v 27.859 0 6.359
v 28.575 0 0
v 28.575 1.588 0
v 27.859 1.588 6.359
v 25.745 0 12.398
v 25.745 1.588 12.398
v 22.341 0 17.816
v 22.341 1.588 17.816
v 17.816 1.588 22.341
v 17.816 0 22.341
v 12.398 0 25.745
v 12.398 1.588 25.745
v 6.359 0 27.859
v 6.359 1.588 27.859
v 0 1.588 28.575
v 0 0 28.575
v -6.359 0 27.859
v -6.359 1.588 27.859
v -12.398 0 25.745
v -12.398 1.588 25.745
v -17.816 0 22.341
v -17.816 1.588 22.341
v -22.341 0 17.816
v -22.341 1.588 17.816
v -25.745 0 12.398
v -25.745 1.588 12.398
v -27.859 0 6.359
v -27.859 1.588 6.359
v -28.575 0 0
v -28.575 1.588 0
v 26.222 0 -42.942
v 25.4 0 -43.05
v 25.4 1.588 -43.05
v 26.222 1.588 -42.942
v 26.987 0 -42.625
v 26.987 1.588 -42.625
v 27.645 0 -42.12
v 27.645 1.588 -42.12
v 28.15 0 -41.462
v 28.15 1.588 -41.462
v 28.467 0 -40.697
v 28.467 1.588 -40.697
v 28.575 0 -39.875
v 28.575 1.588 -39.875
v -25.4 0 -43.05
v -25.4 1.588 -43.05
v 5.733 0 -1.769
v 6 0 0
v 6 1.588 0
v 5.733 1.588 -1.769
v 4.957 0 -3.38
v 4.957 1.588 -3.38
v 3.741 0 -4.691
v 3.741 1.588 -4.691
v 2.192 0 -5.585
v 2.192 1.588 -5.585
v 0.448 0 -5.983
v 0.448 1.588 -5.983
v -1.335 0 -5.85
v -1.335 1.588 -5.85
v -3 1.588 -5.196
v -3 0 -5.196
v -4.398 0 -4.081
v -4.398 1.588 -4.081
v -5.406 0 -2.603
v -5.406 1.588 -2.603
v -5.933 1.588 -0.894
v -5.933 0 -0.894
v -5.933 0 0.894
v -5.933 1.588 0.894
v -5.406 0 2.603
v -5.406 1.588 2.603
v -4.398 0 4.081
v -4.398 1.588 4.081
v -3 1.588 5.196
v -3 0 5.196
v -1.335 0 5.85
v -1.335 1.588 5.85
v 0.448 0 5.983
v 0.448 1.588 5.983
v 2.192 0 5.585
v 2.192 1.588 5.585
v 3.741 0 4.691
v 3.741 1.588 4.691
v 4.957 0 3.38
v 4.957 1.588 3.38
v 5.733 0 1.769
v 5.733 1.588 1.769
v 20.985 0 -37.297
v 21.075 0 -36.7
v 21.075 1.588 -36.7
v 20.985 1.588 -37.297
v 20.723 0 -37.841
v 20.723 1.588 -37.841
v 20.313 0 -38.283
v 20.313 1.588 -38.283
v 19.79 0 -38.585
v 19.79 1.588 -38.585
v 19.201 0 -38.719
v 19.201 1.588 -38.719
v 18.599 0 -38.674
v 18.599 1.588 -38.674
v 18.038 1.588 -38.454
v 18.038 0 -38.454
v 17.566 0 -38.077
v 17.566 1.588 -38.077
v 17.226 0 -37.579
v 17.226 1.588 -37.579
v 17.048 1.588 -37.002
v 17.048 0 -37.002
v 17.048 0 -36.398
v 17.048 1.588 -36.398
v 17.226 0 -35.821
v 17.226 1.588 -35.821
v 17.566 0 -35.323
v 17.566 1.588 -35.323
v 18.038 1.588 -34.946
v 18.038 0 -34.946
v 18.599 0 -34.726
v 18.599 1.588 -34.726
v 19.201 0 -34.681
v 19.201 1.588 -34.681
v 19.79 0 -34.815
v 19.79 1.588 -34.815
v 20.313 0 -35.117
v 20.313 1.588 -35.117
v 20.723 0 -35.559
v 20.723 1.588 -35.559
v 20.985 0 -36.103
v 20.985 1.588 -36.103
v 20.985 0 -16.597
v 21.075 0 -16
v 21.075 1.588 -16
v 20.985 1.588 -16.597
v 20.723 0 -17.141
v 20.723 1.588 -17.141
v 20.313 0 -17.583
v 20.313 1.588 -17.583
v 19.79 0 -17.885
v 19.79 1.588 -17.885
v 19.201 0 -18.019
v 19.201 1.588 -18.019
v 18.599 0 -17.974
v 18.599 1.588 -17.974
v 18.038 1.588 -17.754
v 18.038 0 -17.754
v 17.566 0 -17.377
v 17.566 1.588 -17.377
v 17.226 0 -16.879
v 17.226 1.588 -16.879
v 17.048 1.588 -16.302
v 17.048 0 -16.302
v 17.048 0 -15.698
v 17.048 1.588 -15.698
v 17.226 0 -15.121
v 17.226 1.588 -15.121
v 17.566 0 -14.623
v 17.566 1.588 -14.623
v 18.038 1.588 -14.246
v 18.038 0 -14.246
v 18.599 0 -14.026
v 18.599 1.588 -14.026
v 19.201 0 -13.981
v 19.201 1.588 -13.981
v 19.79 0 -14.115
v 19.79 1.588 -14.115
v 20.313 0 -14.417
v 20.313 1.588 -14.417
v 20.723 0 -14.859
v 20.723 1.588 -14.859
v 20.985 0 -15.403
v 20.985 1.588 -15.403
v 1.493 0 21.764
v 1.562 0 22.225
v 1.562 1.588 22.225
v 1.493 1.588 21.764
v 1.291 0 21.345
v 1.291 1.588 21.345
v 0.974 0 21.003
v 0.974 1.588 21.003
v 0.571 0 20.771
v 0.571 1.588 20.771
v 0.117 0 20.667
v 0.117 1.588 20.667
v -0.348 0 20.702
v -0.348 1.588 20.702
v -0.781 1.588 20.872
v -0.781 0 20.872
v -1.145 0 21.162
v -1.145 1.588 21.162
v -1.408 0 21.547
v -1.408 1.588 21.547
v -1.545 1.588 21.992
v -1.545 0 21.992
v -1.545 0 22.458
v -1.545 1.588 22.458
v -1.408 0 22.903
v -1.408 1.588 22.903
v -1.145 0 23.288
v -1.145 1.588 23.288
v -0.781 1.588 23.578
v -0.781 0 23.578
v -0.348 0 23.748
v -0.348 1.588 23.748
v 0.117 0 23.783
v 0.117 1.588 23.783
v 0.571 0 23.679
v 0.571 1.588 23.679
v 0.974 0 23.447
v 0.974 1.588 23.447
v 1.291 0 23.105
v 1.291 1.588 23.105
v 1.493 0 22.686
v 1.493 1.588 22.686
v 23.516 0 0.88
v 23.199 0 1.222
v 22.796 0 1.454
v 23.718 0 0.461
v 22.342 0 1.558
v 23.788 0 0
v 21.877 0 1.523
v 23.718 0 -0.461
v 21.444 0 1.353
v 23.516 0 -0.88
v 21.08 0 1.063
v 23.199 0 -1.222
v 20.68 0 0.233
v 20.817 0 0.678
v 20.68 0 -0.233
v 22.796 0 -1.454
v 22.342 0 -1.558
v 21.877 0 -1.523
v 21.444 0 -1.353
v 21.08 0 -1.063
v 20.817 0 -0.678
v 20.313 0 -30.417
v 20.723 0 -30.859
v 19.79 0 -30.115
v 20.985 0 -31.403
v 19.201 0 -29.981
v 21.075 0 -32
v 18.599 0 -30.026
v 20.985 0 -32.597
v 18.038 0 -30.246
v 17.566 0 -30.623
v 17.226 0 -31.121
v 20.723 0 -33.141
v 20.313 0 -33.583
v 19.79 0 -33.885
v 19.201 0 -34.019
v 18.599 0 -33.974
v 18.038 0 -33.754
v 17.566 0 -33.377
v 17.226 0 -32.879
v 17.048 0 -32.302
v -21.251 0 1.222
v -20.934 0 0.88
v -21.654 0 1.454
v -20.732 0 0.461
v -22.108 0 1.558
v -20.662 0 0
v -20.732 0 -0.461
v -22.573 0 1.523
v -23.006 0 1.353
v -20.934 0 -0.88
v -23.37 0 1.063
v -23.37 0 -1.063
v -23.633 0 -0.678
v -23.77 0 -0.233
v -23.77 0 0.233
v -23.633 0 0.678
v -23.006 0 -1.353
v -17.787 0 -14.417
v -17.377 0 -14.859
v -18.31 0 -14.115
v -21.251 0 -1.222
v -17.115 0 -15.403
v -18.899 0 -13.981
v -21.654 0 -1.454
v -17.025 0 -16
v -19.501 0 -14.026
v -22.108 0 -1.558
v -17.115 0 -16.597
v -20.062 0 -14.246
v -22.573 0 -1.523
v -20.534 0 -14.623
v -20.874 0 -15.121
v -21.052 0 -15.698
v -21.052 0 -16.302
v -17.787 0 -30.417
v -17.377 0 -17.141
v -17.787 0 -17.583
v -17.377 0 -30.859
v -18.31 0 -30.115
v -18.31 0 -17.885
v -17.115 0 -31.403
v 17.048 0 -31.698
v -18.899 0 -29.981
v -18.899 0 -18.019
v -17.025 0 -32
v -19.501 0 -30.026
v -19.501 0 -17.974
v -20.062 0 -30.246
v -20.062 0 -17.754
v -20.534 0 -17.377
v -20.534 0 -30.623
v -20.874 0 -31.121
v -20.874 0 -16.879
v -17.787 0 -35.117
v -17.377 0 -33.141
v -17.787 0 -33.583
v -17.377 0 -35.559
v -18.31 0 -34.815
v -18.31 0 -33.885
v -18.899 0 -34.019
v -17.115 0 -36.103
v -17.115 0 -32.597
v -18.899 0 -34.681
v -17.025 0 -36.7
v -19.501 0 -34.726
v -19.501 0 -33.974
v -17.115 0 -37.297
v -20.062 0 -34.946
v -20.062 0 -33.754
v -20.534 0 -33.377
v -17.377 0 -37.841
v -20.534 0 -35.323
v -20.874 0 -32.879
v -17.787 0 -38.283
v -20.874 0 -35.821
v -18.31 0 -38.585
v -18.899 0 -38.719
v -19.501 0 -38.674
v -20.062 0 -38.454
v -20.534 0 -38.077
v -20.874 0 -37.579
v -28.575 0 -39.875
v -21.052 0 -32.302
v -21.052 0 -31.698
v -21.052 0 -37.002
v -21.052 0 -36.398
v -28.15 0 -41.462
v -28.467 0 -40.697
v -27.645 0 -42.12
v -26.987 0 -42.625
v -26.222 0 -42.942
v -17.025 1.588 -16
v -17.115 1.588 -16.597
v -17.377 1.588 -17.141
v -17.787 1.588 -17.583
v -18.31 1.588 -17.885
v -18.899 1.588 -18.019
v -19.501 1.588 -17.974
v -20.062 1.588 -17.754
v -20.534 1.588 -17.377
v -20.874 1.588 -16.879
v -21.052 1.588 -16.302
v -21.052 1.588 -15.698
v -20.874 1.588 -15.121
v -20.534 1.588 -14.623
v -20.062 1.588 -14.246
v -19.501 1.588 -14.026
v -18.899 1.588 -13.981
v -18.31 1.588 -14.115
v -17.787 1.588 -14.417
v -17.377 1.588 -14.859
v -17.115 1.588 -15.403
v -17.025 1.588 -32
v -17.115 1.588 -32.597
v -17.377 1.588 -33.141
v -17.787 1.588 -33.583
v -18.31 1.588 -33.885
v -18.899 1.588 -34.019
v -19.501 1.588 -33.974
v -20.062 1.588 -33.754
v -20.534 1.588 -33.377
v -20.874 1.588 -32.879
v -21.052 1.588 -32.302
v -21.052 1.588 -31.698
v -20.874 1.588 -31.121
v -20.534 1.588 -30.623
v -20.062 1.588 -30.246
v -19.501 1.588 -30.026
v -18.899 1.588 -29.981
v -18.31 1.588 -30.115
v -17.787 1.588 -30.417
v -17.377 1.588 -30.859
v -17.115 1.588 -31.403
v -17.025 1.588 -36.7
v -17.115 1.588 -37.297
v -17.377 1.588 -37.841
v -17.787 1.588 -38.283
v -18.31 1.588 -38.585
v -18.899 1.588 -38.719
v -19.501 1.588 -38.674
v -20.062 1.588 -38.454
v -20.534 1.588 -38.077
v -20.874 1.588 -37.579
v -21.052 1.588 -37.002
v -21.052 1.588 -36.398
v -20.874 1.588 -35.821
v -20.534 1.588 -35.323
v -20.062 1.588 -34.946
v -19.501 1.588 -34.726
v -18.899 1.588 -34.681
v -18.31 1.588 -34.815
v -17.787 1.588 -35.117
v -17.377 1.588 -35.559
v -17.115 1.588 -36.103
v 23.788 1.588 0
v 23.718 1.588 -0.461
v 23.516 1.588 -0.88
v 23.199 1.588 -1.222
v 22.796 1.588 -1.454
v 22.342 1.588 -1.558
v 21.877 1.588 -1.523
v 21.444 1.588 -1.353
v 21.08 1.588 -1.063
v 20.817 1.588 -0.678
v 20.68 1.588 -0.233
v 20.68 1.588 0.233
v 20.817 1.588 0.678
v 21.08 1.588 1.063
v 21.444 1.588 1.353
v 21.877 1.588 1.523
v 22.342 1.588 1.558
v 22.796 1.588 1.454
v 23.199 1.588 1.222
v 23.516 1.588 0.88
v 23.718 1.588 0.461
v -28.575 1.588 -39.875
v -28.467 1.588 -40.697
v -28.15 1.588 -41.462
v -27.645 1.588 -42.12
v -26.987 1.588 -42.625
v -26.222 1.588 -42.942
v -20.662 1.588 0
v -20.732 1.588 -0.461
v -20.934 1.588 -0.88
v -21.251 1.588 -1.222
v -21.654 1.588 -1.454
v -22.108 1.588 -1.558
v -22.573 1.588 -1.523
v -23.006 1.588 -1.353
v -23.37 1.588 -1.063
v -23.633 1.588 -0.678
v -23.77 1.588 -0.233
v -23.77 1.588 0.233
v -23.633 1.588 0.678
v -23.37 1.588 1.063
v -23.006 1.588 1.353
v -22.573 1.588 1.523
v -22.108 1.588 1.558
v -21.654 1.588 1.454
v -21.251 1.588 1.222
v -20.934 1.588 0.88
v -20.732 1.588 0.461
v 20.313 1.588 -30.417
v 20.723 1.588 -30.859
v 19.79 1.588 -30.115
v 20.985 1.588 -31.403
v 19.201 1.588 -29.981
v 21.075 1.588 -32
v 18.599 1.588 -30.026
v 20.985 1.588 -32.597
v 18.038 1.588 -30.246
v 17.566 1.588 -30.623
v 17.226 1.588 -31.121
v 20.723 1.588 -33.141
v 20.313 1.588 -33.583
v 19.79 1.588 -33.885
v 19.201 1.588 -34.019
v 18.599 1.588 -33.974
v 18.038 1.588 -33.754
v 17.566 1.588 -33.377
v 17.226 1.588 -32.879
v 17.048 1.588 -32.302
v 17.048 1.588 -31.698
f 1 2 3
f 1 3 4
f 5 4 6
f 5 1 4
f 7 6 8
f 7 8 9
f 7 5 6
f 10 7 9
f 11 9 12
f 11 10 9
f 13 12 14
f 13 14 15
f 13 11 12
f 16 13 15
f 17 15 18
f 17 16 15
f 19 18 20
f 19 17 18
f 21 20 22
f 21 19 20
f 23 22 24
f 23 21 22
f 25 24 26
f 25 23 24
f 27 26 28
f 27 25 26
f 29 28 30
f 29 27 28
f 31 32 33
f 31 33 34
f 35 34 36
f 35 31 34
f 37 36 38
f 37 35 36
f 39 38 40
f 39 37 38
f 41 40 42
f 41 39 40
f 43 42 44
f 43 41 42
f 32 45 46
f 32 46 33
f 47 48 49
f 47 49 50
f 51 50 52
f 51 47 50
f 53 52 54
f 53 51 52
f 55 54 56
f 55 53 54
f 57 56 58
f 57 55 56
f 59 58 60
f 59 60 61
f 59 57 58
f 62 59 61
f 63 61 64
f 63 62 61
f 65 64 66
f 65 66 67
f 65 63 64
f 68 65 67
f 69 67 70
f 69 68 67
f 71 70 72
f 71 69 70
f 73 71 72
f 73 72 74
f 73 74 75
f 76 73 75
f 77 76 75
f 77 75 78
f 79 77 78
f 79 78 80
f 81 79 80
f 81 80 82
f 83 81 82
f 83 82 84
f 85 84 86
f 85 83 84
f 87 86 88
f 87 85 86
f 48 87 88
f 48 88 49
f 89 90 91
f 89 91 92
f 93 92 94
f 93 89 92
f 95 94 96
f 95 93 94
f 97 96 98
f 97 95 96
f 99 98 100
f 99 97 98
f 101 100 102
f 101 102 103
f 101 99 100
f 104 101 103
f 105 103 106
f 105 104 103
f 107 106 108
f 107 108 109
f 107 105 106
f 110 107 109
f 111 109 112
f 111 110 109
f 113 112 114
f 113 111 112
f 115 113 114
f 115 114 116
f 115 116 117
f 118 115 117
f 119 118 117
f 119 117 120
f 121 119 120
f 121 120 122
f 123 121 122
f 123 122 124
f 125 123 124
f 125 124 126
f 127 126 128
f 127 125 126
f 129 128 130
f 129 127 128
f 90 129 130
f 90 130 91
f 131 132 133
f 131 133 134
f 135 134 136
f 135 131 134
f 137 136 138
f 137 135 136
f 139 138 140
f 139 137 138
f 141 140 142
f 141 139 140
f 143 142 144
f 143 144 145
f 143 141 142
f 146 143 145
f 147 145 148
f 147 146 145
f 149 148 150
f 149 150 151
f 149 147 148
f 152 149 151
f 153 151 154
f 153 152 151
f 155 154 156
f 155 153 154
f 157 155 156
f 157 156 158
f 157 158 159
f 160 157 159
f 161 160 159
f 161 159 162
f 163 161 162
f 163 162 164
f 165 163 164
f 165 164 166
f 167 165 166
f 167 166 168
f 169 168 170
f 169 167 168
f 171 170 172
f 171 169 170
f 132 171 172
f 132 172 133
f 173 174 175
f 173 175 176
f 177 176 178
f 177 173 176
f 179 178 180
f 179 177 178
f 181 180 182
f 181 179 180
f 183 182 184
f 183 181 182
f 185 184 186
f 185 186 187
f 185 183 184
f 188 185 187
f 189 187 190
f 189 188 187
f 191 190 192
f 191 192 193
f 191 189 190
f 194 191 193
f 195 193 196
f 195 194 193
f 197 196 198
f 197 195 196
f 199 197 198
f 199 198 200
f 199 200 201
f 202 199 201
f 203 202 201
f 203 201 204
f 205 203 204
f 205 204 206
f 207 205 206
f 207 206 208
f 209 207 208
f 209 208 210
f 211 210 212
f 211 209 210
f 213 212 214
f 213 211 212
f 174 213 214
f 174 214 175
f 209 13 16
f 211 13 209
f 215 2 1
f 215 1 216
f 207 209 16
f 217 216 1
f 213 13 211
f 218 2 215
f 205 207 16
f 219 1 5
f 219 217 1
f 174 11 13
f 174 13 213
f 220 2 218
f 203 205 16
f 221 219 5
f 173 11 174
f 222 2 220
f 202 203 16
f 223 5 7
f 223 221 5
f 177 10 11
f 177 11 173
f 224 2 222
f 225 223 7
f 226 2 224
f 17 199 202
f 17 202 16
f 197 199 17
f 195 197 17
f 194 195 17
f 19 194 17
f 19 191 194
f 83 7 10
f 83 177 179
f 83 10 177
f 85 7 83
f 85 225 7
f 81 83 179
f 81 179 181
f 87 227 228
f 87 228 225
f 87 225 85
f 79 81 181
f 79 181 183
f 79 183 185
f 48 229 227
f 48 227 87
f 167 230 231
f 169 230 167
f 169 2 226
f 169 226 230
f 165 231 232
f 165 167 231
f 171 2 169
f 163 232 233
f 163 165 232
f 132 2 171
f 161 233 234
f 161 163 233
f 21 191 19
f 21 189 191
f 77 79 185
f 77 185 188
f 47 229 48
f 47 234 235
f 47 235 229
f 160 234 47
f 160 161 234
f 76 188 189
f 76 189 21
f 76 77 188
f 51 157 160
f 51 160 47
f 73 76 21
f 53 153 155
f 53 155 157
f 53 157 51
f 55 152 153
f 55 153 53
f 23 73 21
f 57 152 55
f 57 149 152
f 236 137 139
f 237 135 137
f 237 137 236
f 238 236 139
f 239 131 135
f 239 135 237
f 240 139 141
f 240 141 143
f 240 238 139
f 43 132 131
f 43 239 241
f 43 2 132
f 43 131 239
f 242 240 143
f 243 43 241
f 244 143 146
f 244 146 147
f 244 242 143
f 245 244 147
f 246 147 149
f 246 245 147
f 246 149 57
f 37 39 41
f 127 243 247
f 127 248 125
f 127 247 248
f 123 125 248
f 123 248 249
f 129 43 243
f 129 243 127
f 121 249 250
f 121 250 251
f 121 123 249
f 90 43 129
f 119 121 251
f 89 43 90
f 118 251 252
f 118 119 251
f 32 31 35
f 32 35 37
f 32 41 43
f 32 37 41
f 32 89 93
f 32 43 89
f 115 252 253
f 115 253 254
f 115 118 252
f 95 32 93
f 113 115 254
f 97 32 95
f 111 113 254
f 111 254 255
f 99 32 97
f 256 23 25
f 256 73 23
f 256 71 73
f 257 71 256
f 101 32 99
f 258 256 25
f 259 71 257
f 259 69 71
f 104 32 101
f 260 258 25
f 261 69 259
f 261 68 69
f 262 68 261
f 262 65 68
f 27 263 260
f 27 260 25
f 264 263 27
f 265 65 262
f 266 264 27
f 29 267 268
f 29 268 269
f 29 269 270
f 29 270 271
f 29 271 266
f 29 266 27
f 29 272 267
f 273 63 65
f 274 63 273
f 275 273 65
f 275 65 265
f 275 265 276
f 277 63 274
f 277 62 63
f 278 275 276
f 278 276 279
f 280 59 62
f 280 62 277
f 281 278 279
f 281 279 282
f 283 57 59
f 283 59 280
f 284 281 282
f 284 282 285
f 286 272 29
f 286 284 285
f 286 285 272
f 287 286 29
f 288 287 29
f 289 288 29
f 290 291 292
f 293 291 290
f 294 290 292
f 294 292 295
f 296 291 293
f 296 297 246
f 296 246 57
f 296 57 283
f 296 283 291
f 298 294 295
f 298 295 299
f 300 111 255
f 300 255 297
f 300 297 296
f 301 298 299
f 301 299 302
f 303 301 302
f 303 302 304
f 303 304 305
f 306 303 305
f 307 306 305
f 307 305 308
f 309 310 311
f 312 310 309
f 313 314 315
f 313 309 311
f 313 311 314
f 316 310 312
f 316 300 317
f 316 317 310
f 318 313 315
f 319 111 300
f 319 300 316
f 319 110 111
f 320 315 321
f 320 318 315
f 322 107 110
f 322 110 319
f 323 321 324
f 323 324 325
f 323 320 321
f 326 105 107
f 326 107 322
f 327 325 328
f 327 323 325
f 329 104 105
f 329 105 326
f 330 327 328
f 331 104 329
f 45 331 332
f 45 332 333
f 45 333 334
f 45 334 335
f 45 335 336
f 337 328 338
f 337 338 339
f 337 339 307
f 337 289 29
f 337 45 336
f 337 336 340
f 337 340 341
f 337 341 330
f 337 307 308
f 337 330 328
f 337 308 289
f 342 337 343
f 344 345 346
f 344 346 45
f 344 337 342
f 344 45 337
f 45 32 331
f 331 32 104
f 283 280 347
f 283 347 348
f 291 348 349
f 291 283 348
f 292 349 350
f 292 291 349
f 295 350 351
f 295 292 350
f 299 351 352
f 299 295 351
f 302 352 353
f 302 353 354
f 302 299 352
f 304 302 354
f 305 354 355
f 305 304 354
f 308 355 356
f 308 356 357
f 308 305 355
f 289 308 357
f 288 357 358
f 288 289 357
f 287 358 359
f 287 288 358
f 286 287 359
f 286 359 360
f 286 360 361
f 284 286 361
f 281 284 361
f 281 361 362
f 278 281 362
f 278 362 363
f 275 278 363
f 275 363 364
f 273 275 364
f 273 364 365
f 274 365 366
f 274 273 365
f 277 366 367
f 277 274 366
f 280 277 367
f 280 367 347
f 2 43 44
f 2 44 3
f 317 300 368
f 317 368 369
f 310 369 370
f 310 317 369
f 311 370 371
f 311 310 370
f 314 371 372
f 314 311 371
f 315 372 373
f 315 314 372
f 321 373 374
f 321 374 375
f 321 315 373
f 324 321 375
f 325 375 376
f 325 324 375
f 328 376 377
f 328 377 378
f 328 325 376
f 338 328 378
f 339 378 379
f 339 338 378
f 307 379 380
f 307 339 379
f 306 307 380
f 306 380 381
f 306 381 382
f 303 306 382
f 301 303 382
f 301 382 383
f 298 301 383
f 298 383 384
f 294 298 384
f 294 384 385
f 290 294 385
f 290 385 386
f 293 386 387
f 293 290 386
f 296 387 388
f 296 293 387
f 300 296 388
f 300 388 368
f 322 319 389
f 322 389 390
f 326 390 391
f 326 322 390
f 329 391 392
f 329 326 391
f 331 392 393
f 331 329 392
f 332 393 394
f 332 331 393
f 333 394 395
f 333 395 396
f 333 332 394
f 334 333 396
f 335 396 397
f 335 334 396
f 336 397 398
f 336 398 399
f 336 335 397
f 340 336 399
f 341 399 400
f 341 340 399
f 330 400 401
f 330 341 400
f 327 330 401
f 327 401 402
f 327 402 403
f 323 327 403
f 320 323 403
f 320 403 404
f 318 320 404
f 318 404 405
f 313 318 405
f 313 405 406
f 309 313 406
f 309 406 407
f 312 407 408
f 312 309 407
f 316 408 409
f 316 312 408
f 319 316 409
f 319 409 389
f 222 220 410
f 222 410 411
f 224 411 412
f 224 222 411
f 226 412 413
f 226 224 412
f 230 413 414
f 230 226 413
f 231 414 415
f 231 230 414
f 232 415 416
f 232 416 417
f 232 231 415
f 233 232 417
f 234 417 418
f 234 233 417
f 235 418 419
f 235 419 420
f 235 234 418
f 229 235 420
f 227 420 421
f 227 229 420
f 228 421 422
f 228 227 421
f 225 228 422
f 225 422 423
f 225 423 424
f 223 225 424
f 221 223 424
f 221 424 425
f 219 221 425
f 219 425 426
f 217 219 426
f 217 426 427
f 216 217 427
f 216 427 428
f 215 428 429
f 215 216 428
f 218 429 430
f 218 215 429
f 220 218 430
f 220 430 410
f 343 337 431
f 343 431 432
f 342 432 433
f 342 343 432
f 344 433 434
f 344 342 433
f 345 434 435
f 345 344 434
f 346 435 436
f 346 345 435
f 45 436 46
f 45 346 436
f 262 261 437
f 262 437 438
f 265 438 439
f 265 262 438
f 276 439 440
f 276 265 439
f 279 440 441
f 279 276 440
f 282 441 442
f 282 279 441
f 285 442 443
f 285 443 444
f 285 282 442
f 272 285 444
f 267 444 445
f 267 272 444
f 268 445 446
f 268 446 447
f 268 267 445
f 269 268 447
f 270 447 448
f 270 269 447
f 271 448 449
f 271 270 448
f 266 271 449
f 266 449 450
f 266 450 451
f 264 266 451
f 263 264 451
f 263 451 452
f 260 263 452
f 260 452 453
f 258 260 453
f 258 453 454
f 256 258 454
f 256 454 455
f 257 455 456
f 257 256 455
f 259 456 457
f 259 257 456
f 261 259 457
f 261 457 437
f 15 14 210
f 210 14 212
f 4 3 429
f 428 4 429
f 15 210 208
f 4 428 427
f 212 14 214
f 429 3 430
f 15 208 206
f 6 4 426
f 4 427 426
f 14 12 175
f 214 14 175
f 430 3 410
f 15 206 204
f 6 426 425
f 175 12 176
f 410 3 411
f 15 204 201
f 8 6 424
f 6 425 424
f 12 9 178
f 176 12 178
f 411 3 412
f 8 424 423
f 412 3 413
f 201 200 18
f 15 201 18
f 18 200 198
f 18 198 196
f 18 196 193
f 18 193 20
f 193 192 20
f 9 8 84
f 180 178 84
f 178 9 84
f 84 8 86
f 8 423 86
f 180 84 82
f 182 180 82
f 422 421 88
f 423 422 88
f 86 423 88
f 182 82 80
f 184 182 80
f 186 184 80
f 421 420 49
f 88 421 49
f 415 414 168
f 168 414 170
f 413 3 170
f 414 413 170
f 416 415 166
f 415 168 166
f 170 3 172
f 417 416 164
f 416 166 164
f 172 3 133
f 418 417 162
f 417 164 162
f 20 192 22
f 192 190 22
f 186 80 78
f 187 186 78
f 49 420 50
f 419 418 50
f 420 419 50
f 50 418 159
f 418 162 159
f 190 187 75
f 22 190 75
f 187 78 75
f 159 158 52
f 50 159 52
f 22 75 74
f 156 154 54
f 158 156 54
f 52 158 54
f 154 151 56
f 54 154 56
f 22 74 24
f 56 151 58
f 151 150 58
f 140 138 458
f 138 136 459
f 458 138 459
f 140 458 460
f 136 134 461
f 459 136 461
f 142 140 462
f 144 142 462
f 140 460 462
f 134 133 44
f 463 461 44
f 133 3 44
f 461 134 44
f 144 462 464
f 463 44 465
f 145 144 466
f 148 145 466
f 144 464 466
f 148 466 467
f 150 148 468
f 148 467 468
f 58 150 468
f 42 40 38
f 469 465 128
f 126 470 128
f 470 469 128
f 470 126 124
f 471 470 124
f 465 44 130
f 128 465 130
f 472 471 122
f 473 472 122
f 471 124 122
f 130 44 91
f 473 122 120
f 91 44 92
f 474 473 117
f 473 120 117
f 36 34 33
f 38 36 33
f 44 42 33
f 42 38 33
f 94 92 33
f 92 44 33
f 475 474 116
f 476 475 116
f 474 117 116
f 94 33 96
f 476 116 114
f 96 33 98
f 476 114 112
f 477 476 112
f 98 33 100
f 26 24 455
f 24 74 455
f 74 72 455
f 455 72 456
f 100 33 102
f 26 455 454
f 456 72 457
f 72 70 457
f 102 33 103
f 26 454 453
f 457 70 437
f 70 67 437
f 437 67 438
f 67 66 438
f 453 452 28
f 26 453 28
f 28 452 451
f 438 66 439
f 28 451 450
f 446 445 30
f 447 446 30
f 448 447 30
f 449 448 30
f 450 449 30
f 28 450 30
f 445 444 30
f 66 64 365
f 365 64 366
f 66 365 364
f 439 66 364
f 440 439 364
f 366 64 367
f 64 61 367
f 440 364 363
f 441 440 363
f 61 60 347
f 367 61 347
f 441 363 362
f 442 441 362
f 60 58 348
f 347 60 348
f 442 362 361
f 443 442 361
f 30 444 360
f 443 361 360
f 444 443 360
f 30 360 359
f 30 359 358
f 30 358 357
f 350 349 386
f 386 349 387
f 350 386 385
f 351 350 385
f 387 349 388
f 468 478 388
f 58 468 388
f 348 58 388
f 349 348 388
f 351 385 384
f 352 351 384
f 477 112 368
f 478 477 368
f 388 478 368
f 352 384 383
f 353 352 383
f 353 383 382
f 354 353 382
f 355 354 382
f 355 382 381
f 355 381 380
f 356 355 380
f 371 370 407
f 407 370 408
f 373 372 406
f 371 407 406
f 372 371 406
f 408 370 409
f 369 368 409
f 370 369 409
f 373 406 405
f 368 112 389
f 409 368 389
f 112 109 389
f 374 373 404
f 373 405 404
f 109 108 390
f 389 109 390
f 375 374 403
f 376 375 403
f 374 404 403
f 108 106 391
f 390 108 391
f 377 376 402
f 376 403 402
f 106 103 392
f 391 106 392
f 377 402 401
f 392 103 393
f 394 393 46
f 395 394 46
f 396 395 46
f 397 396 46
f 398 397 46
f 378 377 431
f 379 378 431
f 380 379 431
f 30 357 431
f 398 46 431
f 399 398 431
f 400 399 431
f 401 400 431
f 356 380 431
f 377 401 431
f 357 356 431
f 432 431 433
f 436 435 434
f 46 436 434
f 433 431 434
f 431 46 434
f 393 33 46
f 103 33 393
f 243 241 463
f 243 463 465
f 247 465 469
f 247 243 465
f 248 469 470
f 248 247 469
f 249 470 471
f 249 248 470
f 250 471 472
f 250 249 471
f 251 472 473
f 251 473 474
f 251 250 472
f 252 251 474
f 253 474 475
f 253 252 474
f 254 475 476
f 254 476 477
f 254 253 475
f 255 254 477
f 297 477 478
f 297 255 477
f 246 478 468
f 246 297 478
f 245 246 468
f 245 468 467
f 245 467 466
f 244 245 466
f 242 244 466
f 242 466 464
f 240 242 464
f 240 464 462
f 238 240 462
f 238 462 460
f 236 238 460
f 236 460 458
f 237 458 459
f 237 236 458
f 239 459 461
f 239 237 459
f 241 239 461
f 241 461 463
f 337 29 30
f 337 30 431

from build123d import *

# Parameters (mm, degrees)
SKETCH1_R           = 6
SKETCH1_R_2         = 1.5625
SKETCH1_R_3         = 2.025
BOSS_EXTRUDE1_DEPTH = 1.5875


with BuildPart() as part:
    # Sketch1 → Boss-Extrude1 (new body)
    with BuildSketch(Plane(origin=(0, 0, 0), x_dir=(1, 0, 0), z_dir=(0, 1, 0))):
        with BuildLine():
            Line((-28.575, 0), (-28.575, 39.875))
            ThreePointArc((-28.575, 39.875), (-27.64506403, 42.12006403), (-25.4, 43.05))
            Line((-25.4, 43.05), (25.4, 43.05))
            ThreePointArc((25.4, 43.05), (27.64506403, 42.12006403), (28.575, 39.875))
            Line((28.575, 39.875), (28.575, 0))
            ThreePointArc((28.575, 0), (0, -28.575), (-28.575, 0))
        make_face()
        Circle(SKETCH1_R, mode=Mode.SUBTRACT)
        with Locations((-22.225, 0)):
            Circle(SKETCH1_R_2, mode=Mode.SUBTRACT)
        with Locations((0, -22.225)):
            Circle(SKETCH1_R_2, mode=Mode.SUBTRACT)
        with Locations((22.225, 0)):
            Circle(SKETCH1_R_2, mode=Mode.SUBTRACT)
        with Locations((-19.05, 16)):
            Circle(SKETCH1_R_3, mode=Mode.SUBTRACT)
        with Locations((19.05, 16)):
            Circle(SKETCH1_R_3, mode=Mode.SUBTRACT)
        with Locations((19.05, 32)):
            Circle(SKETCH1_R_3, mode=Mode.SUBTRACT)
        with Locations((-19.05, 32)):
            Circle(SKETCH1_R_3, mode=Mode.SUBTRACT)
        with Locations((-19.05, 36.7)):
            Circle(SKETCH1_R_3, mode=Mode.SUBTRACT)
        with Locations((19.05, 36.7)):
            Circle(SKETCH1_R_3, mode=Mode.SUBTRACT)
    extrude(amount=BOSS_EXTRUDE1_DEPTH)


solid = part.part
